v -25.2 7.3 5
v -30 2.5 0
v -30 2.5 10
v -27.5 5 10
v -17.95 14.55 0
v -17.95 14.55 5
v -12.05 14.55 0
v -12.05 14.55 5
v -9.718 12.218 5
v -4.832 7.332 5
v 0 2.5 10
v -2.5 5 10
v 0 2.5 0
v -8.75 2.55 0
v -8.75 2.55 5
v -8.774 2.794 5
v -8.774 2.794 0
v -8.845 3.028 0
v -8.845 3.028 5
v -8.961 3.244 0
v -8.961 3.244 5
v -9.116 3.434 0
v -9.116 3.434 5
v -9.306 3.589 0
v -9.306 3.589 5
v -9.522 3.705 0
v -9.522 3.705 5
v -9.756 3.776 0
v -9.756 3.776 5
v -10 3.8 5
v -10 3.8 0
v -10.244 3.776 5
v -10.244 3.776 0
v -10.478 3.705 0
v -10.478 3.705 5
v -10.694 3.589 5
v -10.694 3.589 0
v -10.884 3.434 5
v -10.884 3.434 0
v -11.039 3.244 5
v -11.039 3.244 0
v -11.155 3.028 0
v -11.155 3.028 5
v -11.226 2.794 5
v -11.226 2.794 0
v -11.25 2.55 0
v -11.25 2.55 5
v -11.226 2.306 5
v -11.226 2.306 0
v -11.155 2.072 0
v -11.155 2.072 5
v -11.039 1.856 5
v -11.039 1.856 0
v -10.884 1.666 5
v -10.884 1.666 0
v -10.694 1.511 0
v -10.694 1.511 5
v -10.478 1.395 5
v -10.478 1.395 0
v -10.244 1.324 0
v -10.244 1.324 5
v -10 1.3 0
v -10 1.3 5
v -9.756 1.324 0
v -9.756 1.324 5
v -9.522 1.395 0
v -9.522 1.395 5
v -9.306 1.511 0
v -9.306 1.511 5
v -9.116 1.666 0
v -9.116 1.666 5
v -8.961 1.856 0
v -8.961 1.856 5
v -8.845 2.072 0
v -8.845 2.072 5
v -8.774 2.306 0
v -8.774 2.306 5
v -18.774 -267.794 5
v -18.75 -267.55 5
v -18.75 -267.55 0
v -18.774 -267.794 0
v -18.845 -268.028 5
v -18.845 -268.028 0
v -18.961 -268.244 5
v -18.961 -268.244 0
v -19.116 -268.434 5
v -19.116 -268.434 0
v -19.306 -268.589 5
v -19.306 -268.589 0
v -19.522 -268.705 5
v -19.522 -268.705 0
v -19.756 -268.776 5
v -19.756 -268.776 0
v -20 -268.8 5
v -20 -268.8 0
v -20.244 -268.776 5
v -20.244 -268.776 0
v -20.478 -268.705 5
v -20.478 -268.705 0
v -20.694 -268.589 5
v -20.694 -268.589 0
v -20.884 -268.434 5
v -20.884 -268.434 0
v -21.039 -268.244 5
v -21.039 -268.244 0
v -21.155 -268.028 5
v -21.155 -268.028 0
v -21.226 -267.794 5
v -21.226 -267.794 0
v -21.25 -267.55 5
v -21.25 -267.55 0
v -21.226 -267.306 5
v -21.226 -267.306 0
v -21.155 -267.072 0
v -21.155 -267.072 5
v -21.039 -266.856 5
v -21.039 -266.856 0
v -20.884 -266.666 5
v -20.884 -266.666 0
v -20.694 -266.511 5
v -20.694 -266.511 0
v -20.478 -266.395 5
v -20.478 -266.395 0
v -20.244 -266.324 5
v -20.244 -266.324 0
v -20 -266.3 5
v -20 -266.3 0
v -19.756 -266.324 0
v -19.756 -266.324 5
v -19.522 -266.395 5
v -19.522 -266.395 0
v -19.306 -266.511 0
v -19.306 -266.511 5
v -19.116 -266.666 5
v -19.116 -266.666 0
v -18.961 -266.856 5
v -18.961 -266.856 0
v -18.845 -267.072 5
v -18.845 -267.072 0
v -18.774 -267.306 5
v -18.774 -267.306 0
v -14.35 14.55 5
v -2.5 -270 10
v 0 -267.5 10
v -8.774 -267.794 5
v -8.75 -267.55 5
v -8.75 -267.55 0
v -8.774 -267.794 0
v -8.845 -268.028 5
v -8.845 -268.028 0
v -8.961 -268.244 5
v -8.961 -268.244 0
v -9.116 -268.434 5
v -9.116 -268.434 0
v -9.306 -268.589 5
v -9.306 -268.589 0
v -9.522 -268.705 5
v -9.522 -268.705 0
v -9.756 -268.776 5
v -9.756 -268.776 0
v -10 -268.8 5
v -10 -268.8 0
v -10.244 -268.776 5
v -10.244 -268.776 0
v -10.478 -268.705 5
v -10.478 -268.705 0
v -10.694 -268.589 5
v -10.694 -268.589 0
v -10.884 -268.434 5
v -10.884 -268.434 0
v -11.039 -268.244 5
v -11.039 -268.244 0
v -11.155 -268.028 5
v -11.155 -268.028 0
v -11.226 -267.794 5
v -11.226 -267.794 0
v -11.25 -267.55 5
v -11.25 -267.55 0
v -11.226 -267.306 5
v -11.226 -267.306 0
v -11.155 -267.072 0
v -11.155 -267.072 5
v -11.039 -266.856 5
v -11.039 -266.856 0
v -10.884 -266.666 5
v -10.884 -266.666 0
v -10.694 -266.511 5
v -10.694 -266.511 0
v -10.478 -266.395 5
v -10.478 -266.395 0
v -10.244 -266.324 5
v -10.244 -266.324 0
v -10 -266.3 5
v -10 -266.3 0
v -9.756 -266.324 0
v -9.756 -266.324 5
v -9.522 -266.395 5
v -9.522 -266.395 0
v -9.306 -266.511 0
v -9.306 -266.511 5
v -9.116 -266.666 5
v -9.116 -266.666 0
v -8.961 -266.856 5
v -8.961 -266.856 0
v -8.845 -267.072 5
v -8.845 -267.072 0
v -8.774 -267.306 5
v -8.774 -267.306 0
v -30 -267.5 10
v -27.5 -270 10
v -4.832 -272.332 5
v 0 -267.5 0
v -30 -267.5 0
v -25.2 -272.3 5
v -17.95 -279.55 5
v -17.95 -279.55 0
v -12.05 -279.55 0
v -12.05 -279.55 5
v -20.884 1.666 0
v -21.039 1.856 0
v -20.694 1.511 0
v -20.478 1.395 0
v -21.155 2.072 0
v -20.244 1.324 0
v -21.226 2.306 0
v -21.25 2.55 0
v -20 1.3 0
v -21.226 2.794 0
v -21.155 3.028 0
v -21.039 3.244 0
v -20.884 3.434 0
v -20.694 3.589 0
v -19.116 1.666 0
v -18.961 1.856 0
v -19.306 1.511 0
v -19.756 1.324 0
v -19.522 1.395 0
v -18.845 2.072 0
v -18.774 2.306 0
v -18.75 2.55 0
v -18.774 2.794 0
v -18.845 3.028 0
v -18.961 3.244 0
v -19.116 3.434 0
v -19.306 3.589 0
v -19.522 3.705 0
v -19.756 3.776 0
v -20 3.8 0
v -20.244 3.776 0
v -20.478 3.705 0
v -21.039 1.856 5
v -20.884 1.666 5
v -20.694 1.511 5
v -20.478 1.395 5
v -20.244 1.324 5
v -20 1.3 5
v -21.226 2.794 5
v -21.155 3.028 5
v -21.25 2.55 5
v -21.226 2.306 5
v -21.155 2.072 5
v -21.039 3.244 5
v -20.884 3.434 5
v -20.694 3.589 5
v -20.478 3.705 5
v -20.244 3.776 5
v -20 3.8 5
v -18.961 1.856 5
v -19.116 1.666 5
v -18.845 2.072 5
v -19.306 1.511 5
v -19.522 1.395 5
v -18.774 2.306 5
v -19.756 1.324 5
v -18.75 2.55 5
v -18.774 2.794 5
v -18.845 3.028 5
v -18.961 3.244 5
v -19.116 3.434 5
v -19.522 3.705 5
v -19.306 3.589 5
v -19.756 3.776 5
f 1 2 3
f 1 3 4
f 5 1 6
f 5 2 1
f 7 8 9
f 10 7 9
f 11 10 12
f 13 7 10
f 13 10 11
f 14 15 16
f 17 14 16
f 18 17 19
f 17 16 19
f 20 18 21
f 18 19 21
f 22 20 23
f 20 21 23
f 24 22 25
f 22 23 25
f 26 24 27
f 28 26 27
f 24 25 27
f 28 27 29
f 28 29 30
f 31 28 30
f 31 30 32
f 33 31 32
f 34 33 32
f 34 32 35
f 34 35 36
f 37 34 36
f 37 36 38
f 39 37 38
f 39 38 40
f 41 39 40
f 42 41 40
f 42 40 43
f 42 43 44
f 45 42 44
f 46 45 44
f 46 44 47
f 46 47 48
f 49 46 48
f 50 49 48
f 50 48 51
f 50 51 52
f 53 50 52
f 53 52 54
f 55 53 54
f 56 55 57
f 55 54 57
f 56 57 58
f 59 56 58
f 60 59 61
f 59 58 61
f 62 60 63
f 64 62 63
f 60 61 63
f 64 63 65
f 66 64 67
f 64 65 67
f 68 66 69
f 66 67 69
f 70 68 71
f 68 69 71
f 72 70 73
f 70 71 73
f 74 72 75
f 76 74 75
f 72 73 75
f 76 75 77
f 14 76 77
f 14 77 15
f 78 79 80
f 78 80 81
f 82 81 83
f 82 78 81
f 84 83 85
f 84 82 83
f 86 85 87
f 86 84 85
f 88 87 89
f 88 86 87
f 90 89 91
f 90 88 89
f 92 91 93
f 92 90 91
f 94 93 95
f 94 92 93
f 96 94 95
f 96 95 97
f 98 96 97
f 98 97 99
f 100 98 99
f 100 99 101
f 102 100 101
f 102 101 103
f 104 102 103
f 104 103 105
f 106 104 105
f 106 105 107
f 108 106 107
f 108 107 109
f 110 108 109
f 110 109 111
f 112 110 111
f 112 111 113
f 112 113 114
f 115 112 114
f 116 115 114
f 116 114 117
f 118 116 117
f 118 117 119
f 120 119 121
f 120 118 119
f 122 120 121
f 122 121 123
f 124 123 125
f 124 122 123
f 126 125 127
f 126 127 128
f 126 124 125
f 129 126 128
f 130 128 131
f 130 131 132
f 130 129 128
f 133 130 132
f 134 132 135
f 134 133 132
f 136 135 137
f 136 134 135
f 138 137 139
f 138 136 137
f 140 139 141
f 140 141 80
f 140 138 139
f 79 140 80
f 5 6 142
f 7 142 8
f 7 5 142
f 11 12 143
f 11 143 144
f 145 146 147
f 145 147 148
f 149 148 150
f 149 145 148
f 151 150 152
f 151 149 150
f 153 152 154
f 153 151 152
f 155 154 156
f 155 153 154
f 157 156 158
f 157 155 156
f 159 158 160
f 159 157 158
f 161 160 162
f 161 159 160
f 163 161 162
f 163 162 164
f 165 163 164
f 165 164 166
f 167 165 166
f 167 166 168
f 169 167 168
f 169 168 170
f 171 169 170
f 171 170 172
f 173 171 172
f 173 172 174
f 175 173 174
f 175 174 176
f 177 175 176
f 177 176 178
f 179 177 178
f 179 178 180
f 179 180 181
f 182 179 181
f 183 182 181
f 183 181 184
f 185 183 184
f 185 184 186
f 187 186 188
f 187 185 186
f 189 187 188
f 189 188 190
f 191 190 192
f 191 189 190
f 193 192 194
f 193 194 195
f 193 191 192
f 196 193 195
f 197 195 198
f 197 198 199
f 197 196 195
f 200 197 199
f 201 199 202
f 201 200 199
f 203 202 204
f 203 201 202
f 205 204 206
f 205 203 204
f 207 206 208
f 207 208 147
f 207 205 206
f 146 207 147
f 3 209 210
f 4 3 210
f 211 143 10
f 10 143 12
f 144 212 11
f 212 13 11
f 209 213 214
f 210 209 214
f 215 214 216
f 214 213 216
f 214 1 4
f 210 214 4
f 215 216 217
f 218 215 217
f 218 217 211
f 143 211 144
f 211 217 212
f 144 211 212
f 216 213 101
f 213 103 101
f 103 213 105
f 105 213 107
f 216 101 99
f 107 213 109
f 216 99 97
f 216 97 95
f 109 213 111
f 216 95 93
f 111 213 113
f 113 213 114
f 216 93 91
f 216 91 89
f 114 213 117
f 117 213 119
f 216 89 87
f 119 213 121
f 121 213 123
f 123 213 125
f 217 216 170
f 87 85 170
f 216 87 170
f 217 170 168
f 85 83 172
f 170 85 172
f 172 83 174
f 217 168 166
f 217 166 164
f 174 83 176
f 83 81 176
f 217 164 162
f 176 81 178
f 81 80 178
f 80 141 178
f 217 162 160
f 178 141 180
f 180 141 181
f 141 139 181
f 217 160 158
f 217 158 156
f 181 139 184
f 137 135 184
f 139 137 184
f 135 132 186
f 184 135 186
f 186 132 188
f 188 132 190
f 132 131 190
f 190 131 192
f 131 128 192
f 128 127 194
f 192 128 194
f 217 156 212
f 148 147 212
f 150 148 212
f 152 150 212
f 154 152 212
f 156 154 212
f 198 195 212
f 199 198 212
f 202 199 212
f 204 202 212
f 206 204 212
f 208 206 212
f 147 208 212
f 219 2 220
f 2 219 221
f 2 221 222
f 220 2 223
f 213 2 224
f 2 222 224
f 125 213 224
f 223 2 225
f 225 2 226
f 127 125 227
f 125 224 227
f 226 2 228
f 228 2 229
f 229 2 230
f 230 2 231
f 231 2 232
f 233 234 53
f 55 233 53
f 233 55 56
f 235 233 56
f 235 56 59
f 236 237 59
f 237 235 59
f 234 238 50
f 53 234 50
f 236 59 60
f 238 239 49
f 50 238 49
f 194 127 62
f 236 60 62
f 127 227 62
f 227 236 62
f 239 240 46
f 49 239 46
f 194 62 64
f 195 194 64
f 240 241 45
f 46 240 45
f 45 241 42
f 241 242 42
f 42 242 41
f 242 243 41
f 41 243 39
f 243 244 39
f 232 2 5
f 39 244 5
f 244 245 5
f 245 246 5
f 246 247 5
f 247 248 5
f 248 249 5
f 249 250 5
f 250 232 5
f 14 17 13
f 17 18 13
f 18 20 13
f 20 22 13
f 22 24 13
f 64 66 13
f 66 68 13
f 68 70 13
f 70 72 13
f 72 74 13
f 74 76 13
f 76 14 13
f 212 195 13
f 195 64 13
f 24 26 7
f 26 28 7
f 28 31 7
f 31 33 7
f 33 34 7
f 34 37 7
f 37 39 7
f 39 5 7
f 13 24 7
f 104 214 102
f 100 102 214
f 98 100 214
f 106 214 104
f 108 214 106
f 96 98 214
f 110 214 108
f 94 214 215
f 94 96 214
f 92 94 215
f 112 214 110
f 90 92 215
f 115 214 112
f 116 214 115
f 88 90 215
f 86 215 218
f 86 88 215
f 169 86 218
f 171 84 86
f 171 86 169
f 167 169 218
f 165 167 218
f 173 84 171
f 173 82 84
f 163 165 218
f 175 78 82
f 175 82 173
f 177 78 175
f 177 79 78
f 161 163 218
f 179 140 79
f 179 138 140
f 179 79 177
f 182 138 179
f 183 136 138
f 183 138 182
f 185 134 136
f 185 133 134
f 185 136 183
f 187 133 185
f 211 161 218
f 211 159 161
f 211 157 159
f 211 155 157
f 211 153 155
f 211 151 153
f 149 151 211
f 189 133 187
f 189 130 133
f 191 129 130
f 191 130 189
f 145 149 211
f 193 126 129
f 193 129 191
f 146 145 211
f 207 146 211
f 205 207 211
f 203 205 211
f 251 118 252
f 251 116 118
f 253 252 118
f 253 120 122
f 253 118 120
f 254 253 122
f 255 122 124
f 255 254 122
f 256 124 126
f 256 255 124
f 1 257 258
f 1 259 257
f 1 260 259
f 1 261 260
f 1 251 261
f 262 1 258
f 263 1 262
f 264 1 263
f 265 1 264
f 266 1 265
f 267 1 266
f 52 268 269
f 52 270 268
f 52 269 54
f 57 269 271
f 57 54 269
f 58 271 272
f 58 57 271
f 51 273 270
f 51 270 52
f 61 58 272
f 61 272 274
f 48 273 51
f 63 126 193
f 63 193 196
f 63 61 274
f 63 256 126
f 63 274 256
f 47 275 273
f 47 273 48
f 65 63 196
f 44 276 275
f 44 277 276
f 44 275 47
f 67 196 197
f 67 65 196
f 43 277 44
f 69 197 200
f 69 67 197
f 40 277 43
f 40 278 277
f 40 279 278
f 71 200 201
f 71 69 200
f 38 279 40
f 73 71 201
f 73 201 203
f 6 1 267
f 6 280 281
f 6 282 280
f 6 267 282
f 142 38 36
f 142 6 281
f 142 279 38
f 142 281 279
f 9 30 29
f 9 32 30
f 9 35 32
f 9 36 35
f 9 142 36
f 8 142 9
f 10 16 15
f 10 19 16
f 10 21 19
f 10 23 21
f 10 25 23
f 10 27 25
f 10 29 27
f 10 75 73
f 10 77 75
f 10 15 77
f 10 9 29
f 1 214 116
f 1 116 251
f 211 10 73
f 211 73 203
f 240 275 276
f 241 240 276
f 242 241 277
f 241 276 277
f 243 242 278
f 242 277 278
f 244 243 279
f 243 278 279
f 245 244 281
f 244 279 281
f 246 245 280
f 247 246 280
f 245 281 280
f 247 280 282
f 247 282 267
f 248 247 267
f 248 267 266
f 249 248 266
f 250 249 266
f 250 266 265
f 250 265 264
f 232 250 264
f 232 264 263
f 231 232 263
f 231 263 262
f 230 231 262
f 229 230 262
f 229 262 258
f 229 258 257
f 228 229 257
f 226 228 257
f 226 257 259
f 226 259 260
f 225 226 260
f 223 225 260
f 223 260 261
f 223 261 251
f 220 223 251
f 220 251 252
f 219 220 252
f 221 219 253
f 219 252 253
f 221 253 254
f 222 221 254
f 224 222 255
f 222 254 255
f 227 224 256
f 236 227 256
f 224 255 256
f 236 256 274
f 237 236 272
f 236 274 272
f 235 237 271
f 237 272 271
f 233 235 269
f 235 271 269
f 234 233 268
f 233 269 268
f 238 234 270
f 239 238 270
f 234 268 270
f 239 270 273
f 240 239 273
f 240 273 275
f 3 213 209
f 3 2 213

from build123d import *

# Parameters (mm, degrees)
EXTRUDE_1_DEPTH     = 10
SKETCH_2_W          = 30
SKETCH_2_H          = 10
EXTRUDE_2_DEPTH     = 267.5
SKETCH_3_W          = 25
SKETCH_3_H          = 309.1
CUT_EXTRUDE_1_DEPTH = 5
CUT_EXTRUDE_1_DRAFT = -25
CUT_EXTRUDE_2_DEPTH = 296.795216324
SKETCH_5_R          = 1.25
CUT_EXTRUDE_3_DEPTH = 10
SKETCH_6_W          = 20.368461709
SKETCH_6_H          = 6.660502167
CUT_EXTRUDE_4_DEPTH = 400


with BuildPart() as part:
    # 스케치1 → 보스-돌출1 (new body)
    with BuildSketch(Plane.XY):
        Polygon((0, 0), (-30, 0), (-30, 2.5), (-17.95, 14.55), (-12.05, 14.55), (0, 2.5), align=None)
    extrude_1 = extrude(amount=EXTRUDE_1_DEPTH)

    # 스케치2 → 보스-돌출2 (add)
    with BuildSketch(Plane.XZ):
        with Locations((-15, 5)):
            Rectangle(SKETCH_2_W, SKETCH_2_H)
    extrude(amount=EXTRUDE_2_DEPTH)

    # 대칭 복사1: 보스-돌출1 across plane
    add(extrude_1.mirror(Plane(origin=(0, -132.5, 0), x_dir=(0, 0, 1), z_dir=(0, -1, 0))))


with BuildPart() as cut_extrude_1_tool:
    # 스케치3 → 컷-돌출1 (with draft: the straight prism first)
    with BuildSketch(Plane.XY.offset(10)):
        with Locations((-15, -140)):
            Rectangle(SKETCH_3_W, SKETCH_3_H)
    extrude(amount=-CUT_EXTRUDE_1_DEPTH)
    # 컷-돌출1: the draft: its side faces are tilted about the plane it starts from
    cut_extrude_1_sides = [cut_extrude_1_tool.faces().sort_by_distance(p)[0] for p in [
        (-27.5, -140, 7.5),
        (-15, -294.55, 7.5),
        (-2.5, -140, 7.5),
        (-15, 14.55, 7.5),
    ]]
    draft(cut_extrude_1_sides, Plane.XY.offset(10), CUT_EXTRUDE_1_DRAFT)


with BuildPart() as part_1:
    add(part.part)

    # 컷-돌출1: cut by cut_extrude_1_tool
    add(cut_extrude_1_tool.part, mode=Mode.SUBTRACT)

    # 스케치4 → 컷-돌출2 (cut, through all)
    with BuildSketch(Plane.XZ.offset(279.55)):
        Polygon((-27.5, 10), (-2.5, 10), (-14.35, 5), (-25.2, 5), align=None)
    extrude(amount=-CUT_EXTRUDE_2_DEPTH, mode=Mode.SUBTRACT)

    # 스케치5 → 컷-돌출3 (cut)
    with BuildSketch(Plane.XY.offset(10)):
        with Locations((-10, 2.55)):
            Circle(SKETCH_5_R)
        with Locations((-20, 2.55)):
            Circle(SKETCH_5_R)
    cut_extrude_3 = extrude(amount=-CUT_EXTRUDE_3_DEPTH, mode=Mode.SUBTRACT)

    # 대칭 복사2: 컷-돌출3 across plane
    add(cut_extrude_3.mirror(Plane(origin=(0, -132.5, 0), x_dir=(0, 0, 1), z_dir=(0, -1, 0))), mode=Mode.SUBTRACT)

    # 스케치6 → 컷-돌출4 (cut)
    with BuildSketch(Plane.XZ.offset(279.55)):
        with Locations((-15.015769146, 8.330251084)):
            Rectangle(SKETCH_6_W, SKETCH_6_H)
    extrude(amount=-CUT_EXTRUDE_4_DEPTH, mode=Mode.SUBTRACT)


solid = part_1.part
